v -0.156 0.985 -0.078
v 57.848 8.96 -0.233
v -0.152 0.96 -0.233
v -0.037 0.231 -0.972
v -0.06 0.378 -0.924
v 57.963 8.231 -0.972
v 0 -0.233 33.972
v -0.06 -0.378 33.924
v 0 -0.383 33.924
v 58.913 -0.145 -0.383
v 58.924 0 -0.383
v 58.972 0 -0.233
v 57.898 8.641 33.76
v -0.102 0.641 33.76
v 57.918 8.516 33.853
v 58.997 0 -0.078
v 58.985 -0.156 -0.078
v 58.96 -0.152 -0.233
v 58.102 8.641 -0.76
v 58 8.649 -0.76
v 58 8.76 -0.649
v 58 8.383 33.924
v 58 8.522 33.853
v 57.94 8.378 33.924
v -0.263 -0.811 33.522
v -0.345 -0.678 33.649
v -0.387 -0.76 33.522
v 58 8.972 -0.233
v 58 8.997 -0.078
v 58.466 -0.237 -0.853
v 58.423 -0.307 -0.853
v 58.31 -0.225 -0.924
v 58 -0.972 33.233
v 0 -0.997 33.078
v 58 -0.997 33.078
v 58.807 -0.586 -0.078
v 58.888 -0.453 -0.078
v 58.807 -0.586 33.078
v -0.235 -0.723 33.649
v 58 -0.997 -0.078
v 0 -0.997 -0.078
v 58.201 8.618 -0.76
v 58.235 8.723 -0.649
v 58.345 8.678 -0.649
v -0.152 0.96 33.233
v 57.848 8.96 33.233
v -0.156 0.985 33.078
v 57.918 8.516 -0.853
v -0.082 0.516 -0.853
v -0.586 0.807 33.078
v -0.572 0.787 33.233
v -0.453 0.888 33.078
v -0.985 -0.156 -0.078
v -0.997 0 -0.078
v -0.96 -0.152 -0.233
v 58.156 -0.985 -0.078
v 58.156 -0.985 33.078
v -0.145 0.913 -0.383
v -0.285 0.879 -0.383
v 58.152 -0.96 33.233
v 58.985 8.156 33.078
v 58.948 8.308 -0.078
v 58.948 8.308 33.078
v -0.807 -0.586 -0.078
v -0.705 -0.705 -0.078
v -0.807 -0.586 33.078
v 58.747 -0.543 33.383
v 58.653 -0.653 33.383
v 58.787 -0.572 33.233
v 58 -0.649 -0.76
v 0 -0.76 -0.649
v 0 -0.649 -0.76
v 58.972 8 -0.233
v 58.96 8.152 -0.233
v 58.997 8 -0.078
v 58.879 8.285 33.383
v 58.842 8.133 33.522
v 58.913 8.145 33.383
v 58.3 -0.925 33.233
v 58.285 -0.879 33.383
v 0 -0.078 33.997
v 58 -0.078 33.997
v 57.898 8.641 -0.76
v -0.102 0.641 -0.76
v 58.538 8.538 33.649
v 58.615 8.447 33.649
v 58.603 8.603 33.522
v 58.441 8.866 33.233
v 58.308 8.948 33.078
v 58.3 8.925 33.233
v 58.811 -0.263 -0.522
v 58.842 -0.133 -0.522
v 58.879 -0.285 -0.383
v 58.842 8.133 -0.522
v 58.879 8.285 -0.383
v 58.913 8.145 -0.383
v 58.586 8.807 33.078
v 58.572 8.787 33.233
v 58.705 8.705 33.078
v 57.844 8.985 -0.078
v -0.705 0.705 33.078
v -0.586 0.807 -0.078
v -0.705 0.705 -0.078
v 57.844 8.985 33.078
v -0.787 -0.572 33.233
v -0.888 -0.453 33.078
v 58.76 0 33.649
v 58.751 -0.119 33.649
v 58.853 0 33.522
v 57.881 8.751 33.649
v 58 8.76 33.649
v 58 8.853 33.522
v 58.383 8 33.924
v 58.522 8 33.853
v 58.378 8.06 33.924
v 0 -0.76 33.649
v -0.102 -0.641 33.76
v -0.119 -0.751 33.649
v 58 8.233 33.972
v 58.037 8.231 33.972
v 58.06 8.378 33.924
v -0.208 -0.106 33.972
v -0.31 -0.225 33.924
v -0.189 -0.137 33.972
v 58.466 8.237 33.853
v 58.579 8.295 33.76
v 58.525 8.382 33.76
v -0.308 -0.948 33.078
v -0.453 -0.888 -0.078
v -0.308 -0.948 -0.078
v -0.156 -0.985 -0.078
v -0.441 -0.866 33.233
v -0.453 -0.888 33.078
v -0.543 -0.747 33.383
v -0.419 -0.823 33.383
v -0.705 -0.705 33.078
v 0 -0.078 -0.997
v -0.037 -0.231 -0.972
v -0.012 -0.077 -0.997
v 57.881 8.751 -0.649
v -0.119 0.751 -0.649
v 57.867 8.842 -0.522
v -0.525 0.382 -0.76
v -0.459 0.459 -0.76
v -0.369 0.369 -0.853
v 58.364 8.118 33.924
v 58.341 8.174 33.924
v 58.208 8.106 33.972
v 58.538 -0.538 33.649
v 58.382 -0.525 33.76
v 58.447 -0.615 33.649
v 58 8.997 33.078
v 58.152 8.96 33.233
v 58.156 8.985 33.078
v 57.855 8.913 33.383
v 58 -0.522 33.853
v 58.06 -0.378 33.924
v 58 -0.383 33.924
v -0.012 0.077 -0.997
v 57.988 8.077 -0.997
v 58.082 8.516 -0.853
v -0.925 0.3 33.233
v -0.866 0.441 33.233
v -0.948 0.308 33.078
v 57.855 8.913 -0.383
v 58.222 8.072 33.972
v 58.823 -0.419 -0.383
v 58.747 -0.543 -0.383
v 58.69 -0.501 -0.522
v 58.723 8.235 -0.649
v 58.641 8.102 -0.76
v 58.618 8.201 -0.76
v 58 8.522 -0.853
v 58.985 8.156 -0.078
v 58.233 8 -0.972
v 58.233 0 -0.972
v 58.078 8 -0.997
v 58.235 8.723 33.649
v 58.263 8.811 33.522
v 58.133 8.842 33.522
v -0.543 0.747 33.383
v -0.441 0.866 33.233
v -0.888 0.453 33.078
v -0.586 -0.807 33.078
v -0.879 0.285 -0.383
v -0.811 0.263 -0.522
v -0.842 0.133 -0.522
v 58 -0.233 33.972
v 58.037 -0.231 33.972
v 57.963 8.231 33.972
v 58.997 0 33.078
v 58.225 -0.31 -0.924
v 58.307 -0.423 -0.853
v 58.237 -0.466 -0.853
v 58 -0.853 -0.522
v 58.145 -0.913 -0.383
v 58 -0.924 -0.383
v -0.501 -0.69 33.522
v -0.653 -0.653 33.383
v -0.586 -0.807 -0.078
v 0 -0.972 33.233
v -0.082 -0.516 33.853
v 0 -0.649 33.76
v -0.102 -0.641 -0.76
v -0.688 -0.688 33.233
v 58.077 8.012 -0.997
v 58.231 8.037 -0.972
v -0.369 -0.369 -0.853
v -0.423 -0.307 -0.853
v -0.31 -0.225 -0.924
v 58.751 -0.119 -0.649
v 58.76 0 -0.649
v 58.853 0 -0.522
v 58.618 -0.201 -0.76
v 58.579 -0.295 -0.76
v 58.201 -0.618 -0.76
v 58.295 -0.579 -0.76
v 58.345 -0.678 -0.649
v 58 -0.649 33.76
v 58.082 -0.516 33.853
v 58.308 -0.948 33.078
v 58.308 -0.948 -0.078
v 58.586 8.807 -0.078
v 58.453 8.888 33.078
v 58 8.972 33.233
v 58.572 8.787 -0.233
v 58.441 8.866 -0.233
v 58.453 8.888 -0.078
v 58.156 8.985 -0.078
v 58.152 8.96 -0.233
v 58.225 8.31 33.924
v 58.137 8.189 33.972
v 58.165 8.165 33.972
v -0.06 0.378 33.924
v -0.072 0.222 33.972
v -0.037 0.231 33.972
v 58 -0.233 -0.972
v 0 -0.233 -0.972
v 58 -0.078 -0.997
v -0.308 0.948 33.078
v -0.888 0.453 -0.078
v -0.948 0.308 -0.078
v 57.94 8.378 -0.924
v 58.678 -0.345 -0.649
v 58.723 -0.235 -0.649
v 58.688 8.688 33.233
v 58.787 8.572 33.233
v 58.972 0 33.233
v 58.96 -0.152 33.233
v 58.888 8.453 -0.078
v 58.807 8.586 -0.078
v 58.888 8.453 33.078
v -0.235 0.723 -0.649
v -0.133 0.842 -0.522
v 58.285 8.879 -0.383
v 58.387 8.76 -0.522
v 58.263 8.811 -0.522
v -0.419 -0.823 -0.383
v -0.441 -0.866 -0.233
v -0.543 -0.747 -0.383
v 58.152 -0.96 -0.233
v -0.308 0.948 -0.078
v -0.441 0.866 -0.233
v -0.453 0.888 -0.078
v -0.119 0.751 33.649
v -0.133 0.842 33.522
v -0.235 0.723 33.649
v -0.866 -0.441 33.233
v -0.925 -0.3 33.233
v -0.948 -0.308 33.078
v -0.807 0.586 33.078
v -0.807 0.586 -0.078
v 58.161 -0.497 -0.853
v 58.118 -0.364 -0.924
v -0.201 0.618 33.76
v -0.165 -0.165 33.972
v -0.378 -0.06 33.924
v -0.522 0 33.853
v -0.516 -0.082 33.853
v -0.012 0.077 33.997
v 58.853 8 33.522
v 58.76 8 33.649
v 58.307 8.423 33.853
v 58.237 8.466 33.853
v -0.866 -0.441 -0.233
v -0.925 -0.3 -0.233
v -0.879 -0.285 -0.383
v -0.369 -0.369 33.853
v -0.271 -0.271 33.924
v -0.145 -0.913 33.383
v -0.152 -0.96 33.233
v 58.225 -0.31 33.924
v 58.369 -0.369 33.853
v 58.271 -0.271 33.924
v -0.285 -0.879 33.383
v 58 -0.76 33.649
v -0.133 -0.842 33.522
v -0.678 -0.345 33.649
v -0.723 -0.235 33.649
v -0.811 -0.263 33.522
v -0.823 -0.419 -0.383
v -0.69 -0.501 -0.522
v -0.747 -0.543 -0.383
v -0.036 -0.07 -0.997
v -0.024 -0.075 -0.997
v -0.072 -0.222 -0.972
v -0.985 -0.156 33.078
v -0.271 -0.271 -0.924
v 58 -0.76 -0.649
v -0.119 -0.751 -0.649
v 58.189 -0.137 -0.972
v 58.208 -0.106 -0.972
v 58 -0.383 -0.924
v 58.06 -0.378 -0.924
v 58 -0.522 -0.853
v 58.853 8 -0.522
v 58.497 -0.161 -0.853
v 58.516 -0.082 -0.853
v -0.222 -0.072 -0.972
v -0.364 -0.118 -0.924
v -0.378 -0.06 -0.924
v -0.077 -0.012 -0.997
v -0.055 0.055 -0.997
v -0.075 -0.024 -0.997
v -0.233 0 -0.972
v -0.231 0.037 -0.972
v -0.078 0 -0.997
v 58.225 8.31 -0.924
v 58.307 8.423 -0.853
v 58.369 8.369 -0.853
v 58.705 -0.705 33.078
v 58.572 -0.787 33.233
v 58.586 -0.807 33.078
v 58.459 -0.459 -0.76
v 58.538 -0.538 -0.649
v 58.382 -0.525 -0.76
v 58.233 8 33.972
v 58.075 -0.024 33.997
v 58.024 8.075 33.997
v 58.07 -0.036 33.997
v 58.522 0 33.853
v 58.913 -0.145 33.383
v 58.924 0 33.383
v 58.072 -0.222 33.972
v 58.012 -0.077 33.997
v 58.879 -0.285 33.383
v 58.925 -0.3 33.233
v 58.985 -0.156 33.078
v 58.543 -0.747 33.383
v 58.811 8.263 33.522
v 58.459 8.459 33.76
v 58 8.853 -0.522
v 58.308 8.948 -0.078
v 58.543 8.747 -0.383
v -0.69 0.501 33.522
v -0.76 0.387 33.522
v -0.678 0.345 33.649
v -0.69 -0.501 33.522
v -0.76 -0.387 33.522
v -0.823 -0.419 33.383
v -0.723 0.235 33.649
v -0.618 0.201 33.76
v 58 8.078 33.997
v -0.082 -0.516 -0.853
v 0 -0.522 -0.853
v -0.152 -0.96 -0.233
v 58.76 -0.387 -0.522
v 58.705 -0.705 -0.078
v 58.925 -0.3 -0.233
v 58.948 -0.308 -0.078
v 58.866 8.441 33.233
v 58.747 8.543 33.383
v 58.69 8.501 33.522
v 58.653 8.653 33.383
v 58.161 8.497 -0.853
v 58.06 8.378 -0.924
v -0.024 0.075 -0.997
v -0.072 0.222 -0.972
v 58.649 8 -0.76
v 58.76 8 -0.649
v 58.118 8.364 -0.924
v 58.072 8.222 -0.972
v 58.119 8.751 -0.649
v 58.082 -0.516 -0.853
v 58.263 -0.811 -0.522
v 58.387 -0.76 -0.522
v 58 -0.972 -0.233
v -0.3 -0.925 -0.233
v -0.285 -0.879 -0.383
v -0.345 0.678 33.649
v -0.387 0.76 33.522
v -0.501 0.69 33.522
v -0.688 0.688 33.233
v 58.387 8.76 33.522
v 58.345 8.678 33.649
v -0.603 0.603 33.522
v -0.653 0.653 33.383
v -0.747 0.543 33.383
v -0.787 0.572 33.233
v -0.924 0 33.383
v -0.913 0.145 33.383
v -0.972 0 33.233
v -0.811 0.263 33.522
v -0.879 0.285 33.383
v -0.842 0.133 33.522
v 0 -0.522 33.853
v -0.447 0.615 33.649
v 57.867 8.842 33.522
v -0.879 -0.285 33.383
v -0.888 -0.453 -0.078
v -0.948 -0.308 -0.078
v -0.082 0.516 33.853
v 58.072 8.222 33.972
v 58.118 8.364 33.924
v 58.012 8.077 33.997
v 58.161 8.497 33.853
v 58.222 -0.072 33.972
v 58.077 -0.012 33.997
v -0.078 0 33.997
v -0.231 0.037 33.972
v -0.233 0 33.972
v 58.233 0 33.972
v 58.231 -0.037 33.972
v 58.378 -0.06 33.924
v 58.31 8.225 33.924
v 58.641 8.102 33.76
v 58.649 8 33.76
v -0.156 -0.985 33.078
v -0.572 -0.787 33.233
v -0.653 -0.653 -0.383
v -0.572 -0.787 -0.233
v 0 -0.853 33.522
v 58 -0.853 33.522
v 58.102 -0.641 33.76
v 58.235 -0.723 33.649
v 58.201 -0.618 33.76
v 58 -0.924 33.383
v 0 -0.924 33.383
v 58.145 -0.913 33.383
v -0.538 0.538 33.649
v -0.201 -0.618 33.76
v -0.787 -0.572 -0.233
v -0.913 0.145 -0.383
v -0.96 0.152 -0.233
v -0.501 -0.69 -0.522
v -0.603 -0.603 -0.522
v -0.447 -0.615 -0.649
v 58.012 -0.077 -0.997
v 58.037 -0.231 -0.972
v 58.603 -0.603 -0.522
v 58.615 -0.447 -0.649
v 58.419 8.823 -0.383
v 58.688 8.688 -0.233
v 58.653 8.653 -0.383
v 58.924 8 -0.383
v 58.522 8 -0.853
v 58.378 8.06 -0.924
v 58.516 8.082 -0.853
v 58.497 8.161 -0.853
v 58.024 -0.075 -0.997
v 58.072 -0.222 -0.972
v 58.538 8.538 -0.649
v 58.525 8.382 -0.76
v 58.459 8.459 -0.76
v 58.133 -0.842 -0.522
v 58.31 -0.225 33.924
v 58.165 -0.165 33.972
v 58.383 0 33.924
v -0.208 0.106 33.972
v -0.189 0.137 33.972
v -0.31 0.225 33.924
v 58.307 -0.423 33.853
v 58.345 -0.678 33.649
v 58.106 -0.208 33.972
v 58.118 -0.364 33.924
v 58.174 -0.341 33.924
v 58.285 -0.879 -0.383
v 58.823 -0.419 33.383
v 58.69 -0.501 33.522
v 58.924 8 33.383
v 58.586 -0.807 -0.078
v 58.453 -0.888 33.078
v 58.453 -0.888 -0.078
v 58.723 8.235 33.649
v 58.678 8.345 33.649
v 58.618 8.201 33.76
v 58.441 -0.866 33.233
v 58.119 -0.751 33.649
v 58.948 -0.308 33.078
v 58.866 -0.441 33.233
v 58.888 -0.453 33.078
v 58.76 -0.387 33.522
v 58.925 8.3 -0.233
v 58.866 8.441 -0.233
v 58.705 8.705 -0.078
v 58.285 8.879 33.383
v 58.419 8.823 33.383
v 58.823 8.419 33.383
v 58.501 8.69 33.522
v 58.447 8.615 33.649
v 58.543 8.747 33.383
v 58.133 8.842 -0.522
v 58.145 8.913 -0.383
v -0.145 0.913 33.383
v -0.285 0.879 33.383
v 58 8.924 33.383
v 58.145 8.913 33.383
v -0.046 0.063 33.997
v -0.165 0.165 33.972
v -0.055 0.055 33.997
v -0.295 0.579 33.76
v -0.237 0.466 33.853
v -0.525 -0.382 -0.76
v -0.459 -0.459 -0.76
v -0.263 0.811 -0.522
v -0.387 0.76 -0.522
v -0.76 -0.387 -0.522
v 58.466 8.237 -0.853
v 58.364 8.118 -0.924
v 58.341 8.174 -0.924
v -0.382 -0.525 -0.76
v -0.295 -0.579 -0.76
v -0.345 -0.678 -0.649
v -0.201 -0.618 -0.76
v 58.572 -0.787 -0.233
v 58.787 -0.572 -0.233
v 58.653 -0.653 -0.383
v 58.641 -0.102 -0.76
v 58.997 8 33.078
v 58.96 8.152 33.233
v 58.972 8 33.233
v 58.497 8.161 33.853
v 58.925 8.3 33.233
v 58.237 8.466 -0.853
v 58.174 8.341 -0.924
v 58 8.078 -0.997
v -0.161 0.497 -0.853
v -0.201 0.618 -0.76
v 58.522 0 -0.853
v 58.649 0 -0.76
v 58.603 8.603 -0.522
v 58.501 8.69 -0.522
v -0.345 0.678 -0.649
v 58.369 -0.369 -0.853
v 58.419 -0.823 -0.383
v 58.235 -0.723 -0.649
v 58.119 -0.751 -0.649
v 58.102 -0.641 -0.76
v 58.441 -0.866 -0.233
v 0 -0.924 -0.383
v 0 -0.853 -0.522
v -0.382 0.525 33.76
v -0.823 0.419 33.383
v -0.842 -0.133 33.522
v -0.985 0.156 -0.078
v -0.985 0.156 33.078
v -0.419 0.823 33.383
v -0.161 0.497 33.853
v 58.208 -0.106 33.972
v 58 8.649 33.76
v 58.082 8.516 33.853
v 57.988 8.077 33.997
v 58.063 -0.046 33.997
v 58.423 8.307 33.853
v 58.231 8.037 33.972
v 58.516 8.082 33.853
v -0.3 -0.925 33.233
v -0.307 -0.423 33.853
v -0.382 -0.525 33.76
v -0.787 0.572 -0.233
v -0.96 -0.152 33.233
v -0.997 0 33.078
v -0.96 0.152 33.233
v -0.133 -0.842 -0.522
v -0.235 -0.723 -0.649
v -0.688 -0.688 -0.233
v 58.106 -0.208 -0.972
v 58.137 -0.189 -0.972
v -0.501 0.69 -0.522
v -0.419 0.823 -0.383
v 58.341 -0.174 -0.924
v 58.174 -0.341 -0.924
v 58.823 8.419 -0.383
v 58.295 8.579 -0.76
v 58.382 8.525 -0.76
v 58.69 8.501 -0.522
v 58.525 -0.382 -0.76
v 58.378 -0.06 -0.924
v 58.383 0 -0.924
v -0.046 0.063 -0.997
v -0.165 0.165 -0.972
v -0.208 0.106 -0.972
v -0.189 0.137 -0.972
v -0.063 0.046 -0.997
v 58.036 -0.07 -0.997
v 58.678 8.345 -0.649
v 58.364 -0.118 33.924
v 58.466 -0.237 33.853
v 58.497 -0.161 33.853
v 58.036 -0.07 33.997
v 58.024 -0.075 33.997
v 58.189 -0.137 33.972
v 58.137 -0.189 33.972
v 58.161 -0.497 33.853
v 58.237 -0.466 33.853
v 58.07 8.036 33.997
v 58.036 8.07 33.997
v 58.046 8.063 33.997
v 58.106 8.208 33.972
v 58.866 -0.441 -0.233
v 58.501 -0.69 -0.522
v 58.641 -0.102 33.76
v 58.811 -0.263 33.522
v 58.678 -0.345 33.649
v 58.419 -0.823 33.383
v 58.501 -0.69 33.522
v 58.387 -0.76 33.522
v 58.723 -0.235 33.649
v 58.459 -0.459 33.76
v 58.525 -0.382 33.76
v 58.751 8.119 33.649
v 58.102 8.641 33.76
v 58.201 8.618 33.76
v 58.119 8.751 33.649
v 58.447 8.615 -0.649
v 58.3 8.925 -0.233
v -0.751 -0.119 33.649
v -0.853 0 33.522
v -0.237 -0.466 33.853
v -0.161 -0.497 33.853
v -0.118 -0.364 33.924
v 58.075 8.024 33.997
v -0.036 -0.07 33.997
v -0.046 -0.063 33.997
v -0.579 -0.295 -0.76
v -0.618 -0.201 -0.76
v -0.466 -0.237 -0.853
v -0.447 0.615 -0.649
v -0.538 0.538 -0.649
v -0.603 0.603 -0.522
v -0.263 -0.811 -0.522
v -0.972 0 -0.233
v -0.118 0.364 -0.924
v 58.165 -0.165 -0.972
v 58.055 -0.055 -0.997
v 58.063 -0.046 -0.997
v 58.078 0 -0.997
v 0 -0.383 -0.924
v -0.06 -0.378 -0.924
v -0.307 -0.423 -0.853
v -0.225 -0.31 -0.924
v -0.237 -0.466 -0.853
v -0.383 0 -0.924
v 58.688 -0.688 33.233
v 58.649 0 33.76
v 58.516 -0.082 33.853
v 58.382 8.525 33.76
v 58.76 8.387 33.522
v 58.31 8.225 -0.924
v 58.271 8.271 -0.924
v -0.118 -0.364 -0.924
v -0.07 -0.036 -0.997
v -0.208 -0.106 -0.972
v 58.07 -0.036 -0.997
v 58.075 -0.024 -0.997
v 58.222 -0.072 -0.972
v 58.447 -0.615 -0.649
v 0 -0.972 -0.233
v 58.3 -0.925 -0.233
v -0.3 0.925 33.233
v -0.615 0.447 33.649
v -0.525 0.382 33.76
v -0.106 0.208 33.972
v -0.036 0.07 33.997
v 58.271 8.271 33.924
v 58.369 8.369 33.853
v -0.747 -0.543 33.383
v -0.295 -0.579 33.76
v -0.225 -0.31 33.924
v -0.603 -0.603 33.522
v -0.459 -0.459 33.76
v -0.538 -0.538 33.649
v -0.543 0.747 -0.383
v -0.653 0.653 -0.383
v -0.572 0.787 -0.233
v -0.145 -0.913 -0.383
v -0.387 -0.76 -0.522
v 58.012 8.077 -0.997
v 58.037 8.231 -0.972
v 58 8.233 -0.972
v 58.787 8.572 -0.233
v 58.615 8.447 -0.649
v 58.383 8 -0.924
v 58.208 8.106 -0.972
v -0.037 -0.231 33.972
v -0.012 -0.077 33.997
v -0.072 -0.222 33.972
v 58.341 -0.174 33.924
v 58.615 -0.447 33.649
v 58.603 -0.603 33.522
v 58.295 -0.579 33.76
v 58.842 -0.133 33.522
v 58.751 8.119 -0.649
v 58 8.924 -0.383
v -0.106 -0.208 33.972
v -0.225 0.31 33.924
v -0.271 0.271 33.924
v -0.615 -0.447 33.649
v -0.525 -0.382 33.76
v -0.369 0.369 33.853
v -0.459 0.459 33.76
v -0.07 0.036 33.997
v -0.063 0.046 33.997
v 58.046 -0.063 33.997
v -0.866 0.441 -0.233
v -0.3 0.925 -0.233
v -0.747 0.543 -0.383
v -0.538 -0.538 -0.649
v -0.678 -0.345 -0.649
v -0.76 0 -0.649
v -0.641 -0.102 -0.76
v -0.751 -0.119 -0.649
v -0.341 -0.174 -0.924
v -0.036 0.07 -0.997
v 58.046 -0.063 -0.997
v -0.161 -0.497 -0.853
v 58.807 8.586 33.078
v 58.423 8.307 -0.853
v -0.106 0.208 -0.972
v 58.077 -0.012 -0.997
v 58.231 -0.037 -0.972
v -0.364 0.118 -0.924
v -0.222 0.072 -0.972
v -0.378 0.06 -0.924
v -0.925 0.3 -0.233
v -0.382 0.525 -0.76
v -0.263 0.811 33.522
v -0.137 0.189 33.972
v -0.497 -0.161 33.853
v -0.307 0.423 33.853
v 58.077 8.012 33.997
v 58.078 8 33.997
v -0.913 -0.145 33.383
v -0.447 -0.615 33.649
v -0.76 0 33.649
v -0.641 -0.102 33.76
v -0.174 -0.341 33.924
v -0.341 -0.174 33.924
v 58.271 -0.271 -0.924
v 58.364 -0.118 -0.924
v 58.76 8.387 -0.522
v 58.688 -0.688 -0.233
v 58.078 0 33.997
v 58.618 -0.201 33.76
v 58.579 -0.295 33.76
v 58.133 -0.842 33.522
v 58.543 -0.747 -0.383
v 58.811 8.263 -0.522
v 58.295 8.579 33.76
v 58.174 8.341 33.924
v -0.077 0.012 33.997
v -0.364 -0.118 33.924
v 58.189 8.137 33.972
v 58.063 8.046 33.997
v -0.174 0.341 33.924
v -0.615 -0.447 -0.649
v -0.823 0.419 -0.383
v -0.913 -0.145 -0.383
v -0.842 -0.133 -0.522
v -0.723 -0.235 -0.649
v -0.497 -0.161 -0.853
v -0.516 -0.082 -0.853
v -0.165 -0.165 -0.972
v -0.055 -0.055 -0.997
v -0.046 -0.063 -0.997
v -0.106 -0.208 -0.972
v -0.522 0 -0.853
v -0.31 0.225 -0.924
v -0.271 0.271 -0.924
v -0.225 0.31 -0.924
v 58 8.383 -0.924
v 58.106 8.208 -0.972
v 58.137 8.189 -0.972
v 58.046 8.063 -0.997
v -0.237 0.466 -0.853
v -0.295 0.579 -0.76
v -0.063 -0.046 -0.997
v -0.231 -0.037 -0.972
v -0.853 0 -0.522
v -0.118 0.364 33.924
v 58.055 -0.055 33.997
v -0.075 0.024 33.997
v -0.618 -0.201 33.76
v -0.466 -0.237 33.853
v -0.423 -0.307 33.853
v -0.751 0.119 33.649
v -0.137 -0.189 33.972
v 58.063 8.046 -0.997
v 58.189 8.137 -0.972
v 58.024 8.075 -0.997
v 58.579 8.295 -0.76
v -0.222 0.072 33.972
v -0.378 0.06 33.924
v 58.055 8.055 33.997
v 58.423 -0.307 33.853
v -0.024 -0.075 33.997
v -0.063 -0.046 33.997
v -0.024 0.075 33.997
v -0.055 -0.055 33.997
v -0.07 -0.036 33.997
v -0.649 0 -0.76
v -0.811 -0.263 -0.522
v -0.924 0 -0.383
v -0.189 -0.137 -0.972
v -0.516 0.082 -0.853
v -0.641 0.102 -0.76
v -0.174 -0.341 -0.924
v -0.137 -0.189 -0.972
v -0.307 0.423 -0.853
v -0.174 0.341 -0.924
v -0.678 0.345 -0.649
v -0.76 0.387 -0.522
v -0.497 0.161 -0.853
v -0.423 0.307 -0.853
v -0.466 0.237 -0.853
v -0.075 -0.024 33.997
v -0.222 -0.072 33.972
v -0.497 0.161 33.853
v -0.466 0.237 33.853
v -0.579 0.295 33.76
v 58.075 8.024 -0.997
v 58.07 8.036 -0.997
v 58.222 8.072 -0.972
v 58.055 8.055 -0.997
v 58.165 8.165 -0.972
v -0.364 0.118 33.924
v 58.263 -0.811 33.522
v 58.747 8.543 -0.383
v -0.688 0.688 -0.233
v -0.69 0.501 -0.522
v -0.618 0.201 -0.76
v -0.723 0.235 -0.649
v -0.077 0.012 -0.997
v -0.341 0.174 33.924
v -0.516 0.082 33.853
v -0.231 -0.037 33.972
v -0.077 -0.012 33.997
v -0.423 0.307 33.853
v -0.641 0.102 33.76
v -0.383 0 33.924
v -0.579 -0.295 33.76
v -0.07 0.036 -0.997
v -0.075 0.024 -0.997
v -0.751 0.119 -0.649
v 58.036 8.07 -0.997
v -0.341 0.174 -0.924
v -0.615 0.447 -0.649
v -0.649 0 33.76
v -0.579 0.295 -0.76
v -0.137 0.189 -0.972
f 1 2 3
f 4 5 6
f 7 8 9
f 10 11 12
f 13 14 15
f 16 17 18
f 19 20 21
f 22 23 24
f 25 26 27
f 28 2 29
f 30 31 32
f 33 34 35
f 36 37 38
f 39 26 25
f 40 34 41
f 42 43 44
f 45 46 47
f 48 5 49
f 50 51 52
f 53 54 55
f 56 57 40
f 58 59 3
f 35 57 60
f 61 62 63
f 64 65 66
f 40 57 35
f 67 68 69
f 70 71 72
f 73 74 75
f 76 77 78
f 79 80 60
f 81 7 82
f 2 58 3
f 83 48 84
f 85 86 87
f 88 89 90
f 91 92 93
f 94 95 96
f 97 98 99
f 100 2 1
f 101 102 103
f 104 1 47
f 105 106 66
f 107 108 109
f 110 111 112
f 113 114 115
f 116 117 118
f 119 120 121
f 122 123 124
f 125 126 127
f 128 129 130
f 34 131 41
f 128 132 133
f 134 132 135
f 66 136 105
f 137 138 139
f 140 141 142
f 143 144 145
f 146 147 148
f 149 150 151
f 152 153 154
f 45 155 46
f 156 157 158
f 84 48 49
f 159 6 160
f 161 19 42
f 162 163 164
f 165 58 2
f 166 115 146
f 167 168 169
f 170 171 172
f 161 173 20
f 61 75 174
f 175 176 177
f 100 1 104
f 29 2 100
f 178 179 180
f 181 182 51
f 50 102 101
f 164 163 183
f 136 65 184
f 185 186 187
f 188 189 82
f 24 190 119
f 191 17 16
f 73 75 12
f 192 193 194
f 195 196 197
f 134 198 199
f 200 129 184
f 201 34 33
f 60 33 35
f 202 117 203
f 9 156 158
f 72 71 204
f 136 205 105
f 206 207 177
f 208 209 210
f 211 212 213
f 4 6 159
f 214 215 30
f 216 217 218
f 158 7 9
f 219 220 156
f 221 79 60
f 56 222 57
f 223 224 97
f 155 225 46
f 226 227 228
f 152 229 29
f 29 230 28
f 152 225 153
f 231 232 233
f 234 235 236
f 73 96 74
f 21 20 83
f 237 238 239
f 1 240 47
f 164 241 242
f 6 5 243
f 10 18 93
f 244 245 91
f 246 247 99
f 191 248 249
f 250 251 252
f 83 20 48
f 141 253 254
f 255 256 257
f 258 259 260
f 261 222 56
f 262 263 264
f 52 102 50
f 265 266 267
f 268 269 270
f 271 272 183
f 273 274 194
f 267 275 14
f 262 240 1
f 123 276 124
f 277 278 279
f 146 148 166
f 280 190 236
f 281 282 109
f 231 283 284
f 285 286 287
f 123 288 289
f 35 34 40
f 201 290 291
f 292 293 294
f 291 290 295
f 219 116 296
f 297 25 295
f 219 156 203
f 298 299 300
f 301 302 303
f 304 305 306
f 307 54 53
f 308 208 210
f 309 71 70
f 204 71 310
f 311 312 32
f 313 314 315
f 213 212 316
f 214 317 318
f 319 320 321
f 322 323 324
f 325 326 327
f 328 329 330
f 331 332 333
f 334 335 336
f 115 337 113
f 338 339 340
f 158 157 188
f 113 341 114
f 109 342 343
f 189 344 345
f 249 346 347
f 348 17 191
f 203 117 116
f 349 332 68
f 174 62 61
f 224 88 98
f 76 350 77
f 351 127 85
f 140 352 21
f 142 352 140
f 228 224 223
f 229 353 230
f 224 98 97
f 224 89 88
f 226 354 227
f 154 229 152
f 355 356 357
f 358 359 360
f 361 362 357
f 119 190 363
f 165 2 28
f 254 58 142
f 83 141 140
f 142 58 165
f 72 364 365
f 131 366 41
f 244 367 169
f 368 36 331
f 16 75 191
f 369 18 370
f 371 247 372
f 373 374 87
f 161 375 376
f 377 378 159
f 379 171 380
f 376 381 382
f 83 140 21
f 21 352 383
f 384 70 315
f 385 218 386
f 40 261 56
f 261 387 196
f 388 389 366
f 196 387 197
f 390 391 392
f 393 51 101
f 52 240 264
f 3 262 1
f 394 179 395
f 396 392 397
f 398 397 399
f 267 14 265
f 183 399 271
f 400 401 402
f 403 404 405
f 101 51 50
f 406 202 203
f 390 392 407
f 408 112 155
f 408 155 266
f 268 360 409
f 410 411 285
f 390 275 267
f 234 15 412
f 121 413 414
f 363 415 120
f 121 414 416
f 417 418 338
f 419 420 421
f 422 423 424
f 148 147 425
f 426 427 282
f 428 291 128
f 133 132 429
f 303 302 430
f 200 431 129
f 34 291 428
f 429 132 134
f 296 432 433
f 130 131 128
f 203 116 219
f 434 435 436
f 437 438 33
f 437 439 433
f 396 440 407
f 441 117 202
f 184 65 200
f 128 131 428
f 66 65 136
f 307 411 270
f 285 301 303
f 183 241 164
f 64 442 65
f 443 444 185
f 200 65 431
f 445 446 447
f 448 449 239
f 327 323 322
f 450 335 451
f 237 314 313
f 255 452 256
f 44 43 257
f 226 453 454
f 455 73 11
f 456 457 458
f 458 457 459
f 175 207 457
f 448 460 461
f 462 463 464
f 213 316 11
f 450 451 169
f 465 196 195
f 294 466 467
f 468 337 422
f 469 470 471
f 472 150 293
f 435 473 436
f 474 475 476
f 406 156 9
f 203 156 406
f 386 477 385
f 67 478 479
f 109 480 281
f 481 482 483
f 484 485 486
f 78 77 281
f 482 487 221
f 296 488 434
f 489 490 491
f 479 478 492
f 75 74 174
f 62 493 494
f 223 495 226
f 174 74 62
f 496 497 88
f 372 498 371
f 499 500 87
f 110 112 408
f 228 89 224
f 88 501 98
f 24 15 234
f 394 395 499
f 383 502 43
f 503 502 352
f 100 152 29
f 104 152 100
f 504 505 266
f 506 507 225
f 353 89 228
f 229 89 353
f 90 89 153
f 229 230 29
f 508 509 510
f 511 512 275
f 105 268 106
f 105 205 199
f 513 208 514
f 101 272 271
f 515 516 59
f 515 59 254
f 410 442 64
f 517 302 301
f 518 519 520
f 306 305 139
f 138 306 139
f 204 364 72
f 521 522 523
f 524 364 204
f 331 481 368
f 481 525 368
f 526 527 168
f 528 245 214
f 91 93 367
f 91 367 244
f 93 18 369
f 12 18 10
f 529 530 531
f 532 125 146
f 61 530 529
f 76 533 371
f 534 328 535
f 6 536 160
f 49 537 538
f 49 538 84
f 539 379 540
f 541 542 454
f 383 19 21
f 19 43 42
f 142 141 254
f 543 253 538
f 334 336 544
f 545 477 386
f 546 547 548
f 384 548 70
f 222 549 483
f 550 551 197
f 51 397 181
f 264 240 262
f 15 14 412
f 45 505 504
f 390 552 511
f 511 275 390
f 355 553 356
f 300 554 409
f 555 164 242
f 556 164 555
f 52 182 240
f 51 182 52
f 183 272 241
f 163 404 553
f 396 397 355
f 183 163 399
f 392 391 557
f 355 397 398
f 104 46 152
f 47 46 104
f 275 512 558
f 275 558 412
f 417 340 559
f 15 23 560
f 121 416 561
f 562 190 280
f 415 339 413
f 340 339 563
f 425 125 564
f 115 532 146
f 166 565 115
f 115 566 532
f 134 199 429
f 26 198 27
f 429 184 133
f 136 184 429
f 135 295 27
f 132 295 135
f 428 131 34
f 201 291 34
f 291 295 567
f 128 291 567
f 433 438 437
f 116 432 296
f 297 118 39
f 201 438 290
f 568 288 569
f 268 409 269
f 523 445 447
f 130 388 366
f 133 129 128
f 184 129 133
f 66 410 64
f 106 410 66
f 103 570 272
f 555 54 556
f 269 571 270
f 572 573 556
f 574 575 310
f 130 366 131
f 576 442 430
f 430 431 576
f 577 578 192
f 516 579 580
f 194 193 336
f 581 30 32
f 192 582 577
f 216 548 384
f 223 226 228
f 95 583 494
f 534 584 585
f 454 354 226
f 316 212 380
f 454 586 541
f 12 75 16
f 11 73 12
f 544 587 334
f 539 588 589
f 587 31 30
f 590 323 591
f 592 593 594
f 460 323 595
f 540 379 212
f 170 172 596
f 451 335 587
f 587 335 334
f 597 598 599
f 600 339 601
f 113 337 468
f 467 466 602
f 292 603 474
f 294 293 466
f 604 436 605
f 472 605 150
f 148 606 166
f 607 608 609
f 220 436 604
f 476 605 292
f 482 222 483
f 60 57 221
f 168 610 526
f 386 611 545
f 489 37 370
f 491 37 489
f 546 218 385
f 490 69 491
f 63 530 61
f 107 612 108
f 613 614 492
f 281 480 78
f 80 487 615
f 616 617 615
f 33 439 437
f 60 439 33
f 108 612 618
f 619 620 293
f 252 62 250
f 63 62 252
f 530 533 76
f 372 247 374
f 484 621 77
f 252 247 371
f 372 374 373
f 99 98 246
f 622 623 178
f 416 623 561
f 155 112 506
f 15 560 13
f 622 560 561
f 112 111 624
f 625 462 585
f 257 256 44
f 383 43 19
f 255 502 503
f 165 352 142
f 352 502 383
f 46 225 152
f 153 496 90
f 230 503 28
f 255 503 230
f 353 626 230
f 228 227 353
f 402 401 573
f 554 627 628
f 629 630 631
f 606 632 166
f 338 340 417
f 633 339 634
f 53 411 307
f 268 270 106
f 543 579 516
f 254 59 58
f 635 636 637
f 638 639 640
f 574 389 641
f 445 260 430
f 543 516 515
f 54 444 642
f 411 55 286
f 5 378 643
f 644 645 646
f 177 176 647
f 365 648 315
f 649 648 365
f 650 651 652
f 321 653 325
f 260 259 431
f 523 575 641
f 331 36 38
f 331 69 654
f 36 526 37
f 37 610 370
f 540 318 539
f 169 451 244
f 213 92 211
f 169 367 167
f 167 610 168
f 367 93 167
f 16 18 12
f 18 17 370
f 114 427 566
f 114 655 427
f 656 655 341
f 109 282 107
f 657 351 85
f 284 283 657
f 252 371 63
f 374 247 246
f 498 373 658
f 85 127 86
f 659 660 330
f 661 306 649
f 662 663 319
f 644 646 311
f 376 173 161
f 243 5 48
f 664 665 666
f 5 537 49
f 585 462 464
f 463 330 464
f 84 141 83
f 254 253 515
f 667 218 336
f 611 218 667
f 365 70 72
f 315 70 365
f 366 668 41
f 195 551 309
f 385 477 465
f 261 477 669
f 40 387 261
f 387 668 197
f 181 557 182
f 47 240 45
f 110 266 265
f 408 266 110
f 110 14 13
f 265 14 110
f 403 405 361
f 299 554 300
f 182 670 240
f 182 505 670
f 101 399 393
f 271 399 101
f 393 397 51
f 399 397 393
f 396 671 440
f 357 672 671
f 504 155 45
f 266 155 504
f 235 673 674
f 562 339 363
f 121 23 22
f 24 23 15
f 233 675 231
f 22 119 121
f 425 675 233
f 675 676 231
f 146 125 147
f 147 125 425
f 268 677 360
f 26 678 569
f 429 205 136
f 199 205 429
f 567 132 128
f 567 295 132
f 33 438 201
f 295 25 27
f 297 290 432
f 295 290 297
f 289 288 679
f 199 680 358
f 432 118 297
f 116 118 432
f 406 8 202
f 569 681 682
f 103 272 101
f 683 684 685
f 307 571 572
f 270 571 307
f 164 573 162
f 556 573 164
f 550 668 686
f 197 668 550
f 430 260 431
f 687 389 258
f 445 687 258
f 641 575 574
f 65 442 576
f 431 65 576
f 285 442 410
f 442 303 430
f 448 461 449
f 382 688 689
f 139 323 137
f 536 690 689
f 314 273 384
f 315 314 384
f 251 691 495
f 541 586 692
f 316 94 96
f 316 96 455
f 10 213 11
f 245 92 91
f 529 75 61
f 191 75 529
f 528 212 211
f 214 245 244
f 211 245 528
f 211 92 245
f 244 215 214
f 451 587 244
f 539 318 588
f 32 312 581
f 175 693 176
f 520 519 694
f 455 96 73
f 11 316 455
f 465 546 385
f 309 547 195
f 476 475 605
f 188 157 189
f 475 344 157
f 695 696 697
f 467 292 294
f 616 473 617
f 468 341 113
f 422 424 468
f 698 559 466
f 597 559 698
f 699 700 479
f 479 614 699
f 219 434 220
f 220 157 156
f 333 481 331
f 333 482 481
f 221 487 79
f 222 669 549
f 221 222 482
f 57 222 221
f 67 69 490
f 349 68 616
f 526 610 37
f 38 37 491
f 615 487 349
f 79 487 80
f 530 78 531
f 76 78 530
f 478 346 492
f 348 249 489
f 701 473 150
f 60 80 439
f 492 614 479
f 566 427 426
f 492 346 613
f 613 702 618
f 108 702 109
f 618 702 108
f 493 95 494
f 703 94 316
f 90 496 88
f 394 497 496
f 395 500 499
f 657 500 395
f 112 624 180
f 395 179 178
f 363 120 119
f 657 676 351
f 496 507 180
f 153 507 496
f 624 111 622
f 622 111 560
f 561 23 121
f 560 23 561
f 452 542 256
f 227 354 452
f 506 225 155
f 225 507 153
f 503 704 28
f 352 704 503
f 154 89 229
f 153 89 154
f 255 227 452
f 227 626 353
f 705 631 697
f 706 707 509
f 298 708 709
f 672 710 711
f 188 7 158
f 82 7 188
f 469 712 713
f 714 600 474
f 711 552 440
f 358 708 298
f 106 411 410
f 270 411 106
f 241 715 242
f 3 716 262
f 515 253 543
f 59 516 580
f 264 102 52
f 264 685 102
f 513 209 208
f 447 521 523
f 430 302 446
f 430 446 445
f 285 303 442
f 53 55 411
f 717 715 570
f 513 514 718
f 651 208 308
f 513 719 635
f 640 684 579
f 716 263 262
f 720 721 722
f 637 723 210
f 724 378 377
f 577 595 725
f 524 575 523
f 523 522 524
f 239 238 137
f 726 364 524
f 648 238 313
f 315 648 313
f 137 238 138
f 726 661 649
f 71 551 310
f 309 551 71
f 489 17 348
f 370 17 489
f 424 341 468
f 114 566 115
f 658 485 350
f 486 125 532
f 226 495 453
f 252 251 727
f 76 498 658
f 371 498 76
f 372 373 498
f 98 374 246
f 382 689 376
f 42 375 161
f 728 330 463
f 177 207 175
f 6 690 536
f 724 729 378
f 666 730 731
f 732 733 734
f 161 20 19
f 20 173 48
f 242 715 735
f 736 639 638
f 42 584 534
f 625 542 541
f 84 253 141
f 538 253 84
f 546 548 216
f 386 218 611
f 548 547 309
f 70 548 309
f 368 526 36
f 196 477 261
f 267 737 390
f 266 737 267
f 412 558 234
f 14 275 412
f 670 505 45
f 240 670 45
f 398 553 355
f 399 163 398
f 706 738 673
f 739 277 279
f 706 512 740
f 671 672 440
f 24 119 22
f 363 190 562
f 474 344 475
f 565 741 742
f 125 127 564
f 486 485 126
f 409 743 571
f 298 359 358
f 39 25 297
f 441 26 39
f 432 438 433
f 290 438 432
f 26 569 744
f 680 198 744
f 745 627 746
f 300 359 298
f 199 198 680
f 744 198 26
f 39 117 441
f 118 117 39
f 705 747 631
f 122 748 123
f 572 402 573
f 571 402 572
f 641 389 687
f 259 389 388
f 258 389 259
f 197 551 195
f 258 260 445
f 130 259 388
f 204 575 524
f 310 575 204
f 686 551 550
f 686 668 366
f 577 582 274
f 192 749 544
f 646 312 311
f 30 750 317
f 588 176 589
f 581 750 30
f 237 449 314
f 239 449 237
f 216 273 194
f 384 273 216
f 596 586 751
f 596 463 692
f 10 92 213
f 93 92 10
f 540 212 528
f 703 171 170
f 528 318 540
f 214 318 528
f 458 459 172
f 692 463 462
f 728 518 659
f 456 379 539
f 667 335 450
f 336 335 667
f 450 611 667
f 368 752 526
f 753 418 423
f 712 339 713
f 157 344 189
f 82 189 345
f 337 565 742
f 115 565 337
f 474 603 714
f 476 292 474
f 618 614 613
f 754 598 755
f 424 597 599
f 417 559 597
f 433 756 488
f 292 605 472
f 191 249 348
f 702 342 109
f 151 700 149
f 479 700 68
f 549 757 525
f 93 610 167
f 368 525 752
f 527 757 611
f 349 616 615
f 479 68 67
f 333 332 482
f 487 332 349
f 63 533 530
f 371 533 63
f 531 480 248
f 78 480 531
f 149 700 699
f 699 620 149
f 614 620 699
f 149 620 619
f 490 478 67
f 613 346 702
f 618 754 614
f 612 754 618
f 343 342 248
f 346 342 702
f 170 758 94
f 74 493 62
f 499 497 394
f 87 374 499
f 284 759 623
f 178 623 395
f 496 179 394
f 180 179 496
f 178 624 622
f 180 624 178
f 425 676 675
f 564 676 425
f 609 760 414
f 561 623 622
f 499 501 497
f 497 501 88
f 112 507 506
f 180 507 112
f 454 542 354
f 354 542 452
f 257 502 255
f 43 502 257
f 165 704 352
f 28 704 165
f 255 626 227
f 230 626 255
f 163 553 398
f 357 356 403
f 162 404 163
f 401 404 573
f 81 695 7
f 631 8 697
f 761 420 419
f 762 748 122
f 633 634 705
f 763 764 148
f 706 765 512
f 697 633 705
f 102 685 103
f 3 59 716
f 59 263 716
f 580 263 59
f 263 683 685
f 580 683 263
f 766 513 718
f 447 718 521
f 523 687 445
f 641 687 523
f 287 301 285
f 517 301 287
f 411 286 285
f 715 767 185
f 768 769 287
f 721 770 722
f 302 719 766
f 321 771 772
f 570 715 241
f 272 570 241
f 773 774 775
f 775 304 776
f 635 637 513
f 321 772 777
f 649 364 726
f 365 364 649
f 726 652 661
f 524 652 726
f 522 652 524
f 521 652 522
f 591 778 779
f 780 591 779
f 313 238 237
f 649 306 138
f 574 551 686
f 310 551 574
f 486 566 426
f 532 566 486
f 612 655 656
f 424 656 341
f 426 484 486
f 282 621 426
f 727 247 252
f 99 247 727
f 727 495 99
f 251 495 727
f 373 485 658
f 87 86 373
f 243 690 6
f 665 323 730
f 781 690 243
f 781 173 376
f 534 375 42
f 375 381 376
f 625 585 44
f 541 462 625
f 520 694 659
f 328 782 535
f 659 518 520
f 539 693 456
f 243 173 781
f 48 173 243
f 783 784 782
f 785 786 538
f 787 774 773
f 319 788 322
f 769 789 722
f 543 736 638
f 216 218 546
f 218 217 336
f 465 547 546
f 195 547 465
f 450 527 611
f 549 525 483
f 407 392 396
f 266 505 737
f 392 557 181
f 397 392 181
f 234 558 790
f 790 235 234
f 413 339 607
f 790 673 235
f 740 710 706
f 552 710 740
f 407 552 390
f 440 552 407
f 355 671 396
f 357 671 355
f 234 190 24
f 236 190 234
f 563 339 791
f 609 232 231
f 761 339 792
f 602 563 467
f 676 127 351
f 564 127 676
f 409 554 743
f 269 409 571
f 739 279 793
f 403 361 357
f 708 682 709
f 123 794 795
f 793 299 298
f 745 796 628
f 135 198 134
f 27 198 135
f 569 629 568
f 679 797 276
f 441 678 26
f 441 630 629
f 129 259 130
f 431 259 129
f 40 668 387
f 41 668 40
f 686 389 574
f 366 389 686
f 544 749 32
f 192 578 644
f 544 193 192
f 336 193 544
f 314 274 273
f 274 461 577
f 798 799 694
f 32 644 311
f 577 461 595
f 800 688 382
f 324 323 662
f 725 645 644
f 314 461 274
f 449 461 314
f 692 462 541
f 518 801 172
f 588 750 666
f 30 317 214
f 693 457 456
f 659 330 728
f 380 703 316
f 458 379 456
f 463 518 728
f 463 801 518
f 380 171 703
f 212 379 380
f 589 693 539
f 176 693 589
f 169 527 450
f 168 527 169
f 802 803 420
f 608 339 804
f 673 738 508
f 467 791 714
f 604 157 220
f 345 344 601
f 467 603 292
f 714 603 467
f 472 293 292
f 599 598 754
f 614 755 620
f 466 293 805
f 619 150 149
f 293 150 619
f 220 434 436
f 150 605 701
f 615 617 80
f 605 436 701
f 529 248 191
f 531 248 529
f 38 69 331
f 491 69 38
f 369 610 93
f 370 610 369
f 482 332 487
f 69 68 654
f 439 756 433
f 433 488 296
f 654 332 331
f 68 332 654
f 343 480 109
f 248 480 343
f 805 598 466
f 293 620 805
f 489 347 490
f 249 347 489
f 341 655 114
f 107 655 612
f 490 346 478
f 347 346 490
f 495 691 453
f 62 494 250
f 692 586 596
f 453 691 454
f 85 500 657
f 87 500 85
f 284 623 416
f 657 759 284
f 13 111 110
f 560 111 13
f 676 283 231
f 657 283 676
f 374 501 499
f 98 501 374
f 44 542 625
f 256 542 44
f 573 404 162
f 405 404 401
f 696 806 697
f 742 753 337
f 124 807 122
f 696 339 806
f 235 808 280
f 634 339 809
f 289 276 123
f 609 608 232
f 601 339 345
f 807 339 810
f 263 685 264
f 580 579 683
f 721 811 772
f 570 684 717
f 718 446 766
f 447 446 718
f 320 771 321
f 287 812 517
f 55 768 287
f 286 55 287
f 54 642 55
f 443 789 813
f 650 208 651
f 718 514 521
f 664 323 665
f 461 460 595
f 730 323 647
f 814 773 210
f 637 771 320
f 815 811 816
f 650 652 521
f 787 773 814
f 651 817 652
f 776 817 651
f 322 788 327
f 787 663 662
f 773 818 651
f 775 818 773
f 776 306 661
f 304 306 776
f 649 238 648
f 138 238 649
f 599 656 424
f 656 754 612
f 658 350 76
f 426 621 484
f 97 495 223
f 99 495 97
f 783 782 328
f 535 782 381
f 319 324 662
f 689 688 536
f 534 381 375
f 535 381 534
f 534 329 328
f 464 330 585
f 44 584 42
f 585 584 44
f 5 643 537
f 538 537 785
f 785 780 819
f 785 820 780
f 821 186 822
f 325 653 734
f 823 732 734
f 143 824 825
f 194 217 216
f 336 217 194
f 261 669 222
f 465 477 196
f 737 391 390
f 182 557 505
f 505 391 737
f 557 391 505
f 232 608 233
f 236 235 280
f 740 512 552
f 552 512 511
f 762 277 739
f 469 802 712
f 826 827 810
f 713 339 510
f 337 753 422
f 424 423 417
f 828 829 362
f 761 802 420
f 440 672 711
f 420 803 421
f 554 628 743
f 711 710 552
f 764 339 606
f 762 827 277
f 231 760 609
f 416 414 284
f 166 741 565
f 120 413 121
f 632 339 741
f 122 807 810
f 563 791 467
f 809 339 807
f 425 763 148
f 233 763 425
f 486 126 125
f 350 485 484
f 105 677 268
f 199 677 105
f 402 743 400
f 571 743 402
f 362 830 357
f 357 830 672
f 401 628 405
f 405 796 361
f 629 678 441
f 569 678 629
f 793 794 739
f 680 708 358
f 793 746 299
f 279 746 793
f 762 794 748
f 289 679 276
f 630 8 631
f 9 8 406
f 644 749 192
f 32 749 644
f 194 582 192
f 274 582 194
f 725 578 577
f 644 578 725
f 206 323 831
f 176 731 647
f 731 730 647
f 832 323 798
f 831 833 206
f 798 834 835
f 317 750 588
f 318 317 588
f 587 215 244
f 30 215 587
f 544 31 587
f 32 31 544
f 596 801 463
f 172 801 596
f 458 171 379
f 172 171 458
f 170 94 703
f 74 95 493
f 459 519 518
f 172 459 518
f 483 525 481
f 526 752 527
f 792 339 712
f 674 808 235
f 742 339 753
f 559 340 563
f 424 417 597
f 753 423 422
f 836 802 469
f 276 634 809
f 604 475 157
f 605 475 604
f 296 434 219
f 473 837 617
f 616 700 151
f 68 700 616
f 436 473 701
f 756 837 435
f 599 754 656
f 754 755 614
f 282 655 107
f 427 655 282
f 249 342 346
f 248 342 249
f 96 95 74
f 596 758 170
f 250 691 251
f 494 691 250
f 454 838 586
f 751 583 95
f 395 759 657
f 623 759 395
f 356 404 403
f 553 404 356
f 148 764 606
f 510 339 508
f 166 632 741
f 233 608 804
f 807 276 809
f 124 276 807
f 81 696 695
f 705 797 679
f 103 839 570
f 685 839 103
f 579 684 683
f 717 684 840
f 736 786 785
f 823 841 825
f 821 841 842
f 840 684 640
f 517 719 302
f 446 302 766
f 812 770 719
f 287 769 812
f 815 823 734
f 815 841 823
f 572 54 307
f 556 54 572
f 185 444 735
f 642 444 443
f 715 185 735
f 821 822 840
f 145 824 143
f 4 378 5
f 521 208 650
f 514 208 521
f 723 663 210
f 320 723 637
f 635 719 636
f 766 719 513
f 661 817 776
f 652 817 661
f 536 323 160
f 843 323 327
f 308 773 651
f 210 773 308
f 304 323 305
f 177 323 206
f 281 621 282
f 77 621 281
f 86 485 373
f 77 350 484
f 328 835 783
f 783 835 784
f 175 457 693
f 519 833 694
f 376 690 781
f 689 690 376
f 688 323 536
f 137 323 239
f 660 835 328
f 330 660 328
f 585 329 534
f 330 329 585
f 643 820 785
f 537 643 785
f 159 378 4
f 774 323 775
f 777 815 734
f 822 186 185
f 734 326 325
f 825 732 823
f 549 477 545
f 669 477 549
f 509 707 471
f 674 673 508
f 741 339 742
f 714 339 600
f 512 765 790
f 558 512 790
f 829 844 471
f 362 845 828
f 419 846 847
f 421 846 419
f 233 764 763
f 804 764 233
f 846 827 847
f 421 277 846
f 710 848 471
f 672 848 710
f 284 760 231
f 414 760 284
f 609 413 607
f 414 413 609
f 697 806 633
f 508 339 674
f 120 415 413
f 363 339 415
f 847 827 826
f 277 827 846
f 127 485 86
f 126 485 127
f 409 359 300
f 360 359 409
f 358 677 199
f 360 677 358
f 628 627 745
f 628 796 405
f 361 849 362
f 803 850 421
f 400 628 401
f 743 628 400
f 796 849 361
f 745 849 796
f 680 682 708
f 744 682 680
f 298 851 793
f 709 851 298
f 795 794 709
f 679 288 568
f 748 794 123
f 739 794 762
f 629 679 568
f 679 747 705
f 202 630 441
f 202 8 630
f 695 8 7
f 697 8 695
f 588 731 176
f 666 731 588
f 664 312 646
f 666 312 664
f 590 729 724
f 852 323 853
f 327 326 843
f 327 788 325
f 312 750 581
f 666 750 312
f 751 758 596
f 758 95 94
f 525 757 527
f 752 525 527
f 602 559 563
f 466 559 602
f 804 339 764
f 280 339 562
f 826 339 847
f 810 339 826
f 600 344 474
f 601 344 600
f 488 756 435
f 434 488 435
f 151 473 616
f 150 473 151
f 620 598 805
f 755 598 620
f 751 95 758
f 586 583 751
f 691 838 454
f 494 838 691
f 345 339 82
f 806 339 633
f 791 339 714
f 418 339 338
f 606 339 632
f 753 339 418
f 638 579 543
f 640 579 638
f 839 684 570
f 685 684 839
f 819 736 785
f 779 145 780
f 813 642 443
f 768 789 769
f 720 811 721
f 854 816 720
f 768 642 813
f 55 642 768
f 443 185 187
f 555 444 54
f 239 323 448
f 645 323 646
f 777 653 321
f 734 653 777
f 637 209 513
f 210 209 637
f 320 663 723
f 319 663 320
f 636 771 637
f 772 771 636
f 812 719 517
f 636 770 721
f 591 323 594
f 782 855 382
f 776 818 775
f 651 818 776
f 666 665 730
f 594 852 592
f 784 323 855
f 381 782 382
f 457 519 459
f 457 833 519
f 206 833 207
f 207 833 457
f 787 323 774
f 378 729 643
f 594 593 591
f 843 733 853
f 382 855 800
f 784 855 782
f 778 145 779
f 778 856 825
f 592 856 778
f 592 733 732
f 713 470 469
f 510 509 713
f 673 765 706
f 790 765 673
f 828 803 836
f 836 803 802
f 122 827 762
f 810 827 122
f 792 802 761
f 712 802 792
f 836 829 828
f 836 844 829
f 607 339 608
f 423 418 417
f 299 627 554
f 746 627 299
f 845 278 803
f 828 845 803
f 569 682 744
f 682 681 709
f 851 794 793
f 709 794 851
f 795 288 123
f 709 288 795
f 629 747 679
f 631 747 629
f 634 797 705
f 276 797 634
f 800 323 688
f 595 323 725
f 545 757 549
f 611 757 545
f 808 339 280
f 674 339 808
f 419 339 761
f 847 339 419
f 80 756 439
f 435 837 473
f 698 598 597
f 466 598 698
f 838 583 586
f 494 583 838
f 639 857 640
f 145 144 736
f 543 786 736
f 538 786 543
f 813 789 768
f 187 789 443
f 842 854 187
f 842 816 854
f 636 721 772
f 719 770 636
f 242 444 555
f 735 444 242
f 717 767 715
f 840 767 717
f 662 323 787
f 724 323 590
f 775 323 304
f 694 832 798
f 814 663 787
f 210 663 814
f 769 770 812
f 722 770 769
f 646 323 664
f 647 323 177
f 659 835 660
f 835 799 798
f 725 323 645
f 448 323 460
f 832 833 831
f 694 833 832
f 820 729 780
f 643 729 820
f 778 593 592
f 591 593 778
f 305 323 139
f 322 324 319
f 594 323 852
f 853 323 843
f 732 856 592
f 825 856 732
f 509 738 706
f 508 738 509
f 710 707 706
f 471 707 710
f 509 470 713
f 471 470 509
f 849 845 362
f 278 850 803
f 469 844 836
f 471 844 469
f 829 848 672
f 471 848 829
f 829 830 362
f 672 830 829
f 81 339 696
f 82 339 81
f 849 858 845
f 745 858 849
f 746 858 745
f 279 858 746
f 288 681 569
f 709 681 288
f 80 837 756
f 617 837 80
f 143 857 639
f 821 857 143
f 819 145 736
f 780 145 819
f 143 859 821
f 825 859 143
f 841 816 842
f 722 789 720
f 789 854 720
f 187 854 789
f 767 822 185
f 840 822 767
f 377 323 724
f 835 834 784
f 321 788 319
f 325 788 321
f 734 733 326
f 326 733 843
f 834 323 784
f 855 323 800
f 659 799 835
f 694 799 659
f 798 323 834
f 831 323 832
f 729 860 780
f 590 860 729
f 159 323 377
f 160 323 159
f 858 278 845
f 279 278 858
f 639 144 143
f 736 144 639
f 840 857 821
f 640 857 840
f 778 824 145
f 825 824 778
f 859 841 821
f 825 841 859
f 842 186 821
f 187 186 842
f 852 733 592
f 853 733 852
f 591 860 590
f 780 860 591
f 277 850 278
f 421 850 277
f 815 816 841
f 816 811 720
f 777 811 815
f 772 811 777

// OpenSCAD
/// Downloaded from:
///  https://www.printables.com/model/63301-customizable-wedge/files
///  2025-Sep-04

// A very simple customizable wedge with a radius around all edges

// facet parameter (only change if you know what you do)
$fn=40;

// radius at the corners should be at least half as the smallest height or width.

// radius at all corners (set to 0 if you dont want any round corners)
radius = 1;
offset = radius*2;

//length of the wedge (x axis)
length = 60;
// width of the wedge (z axis)
width = 35;
// height of the wedge at the beginning (y axis)
begin_height = 10;
// height of the wedge at the end (y axis)
end_height   = 2;

minkowski()
{
  {
    linear_extrude(height = width - offset, center = false)
      polygon(points=[[0,0],[length - offset,0],[length - offset,begin_height - offset],[0,end_height - offset],[0,0]]);
  }
  sphere(r=radius);
}

//length of the wedge (y axis)
//width of the wedge (x axis)
//heights (z axis)
// radius must be less than or equal to 1/2 of MIN(begin_height, end_height)
module wedge_rounded_corner (length = 60, width = 35, begin_height = 10, end_height = 2, radius = 0) {

  loffset = radius*2;
  translate([width - radius, length - radius, + radius])
  rotate([0,-90,0])
  rotate([0,0,-90])
  minkowski()
    {
      {
        linear_extrude(height = width - loffset, center = false)
          polygon(points=[[0,0],
                          [length - loffset,0],
                          [length - loffset,begin_height - loffset],
                          [0,end_height - loffset],[0,0]]);
      }
      sphere(r=radius);
    }
}
